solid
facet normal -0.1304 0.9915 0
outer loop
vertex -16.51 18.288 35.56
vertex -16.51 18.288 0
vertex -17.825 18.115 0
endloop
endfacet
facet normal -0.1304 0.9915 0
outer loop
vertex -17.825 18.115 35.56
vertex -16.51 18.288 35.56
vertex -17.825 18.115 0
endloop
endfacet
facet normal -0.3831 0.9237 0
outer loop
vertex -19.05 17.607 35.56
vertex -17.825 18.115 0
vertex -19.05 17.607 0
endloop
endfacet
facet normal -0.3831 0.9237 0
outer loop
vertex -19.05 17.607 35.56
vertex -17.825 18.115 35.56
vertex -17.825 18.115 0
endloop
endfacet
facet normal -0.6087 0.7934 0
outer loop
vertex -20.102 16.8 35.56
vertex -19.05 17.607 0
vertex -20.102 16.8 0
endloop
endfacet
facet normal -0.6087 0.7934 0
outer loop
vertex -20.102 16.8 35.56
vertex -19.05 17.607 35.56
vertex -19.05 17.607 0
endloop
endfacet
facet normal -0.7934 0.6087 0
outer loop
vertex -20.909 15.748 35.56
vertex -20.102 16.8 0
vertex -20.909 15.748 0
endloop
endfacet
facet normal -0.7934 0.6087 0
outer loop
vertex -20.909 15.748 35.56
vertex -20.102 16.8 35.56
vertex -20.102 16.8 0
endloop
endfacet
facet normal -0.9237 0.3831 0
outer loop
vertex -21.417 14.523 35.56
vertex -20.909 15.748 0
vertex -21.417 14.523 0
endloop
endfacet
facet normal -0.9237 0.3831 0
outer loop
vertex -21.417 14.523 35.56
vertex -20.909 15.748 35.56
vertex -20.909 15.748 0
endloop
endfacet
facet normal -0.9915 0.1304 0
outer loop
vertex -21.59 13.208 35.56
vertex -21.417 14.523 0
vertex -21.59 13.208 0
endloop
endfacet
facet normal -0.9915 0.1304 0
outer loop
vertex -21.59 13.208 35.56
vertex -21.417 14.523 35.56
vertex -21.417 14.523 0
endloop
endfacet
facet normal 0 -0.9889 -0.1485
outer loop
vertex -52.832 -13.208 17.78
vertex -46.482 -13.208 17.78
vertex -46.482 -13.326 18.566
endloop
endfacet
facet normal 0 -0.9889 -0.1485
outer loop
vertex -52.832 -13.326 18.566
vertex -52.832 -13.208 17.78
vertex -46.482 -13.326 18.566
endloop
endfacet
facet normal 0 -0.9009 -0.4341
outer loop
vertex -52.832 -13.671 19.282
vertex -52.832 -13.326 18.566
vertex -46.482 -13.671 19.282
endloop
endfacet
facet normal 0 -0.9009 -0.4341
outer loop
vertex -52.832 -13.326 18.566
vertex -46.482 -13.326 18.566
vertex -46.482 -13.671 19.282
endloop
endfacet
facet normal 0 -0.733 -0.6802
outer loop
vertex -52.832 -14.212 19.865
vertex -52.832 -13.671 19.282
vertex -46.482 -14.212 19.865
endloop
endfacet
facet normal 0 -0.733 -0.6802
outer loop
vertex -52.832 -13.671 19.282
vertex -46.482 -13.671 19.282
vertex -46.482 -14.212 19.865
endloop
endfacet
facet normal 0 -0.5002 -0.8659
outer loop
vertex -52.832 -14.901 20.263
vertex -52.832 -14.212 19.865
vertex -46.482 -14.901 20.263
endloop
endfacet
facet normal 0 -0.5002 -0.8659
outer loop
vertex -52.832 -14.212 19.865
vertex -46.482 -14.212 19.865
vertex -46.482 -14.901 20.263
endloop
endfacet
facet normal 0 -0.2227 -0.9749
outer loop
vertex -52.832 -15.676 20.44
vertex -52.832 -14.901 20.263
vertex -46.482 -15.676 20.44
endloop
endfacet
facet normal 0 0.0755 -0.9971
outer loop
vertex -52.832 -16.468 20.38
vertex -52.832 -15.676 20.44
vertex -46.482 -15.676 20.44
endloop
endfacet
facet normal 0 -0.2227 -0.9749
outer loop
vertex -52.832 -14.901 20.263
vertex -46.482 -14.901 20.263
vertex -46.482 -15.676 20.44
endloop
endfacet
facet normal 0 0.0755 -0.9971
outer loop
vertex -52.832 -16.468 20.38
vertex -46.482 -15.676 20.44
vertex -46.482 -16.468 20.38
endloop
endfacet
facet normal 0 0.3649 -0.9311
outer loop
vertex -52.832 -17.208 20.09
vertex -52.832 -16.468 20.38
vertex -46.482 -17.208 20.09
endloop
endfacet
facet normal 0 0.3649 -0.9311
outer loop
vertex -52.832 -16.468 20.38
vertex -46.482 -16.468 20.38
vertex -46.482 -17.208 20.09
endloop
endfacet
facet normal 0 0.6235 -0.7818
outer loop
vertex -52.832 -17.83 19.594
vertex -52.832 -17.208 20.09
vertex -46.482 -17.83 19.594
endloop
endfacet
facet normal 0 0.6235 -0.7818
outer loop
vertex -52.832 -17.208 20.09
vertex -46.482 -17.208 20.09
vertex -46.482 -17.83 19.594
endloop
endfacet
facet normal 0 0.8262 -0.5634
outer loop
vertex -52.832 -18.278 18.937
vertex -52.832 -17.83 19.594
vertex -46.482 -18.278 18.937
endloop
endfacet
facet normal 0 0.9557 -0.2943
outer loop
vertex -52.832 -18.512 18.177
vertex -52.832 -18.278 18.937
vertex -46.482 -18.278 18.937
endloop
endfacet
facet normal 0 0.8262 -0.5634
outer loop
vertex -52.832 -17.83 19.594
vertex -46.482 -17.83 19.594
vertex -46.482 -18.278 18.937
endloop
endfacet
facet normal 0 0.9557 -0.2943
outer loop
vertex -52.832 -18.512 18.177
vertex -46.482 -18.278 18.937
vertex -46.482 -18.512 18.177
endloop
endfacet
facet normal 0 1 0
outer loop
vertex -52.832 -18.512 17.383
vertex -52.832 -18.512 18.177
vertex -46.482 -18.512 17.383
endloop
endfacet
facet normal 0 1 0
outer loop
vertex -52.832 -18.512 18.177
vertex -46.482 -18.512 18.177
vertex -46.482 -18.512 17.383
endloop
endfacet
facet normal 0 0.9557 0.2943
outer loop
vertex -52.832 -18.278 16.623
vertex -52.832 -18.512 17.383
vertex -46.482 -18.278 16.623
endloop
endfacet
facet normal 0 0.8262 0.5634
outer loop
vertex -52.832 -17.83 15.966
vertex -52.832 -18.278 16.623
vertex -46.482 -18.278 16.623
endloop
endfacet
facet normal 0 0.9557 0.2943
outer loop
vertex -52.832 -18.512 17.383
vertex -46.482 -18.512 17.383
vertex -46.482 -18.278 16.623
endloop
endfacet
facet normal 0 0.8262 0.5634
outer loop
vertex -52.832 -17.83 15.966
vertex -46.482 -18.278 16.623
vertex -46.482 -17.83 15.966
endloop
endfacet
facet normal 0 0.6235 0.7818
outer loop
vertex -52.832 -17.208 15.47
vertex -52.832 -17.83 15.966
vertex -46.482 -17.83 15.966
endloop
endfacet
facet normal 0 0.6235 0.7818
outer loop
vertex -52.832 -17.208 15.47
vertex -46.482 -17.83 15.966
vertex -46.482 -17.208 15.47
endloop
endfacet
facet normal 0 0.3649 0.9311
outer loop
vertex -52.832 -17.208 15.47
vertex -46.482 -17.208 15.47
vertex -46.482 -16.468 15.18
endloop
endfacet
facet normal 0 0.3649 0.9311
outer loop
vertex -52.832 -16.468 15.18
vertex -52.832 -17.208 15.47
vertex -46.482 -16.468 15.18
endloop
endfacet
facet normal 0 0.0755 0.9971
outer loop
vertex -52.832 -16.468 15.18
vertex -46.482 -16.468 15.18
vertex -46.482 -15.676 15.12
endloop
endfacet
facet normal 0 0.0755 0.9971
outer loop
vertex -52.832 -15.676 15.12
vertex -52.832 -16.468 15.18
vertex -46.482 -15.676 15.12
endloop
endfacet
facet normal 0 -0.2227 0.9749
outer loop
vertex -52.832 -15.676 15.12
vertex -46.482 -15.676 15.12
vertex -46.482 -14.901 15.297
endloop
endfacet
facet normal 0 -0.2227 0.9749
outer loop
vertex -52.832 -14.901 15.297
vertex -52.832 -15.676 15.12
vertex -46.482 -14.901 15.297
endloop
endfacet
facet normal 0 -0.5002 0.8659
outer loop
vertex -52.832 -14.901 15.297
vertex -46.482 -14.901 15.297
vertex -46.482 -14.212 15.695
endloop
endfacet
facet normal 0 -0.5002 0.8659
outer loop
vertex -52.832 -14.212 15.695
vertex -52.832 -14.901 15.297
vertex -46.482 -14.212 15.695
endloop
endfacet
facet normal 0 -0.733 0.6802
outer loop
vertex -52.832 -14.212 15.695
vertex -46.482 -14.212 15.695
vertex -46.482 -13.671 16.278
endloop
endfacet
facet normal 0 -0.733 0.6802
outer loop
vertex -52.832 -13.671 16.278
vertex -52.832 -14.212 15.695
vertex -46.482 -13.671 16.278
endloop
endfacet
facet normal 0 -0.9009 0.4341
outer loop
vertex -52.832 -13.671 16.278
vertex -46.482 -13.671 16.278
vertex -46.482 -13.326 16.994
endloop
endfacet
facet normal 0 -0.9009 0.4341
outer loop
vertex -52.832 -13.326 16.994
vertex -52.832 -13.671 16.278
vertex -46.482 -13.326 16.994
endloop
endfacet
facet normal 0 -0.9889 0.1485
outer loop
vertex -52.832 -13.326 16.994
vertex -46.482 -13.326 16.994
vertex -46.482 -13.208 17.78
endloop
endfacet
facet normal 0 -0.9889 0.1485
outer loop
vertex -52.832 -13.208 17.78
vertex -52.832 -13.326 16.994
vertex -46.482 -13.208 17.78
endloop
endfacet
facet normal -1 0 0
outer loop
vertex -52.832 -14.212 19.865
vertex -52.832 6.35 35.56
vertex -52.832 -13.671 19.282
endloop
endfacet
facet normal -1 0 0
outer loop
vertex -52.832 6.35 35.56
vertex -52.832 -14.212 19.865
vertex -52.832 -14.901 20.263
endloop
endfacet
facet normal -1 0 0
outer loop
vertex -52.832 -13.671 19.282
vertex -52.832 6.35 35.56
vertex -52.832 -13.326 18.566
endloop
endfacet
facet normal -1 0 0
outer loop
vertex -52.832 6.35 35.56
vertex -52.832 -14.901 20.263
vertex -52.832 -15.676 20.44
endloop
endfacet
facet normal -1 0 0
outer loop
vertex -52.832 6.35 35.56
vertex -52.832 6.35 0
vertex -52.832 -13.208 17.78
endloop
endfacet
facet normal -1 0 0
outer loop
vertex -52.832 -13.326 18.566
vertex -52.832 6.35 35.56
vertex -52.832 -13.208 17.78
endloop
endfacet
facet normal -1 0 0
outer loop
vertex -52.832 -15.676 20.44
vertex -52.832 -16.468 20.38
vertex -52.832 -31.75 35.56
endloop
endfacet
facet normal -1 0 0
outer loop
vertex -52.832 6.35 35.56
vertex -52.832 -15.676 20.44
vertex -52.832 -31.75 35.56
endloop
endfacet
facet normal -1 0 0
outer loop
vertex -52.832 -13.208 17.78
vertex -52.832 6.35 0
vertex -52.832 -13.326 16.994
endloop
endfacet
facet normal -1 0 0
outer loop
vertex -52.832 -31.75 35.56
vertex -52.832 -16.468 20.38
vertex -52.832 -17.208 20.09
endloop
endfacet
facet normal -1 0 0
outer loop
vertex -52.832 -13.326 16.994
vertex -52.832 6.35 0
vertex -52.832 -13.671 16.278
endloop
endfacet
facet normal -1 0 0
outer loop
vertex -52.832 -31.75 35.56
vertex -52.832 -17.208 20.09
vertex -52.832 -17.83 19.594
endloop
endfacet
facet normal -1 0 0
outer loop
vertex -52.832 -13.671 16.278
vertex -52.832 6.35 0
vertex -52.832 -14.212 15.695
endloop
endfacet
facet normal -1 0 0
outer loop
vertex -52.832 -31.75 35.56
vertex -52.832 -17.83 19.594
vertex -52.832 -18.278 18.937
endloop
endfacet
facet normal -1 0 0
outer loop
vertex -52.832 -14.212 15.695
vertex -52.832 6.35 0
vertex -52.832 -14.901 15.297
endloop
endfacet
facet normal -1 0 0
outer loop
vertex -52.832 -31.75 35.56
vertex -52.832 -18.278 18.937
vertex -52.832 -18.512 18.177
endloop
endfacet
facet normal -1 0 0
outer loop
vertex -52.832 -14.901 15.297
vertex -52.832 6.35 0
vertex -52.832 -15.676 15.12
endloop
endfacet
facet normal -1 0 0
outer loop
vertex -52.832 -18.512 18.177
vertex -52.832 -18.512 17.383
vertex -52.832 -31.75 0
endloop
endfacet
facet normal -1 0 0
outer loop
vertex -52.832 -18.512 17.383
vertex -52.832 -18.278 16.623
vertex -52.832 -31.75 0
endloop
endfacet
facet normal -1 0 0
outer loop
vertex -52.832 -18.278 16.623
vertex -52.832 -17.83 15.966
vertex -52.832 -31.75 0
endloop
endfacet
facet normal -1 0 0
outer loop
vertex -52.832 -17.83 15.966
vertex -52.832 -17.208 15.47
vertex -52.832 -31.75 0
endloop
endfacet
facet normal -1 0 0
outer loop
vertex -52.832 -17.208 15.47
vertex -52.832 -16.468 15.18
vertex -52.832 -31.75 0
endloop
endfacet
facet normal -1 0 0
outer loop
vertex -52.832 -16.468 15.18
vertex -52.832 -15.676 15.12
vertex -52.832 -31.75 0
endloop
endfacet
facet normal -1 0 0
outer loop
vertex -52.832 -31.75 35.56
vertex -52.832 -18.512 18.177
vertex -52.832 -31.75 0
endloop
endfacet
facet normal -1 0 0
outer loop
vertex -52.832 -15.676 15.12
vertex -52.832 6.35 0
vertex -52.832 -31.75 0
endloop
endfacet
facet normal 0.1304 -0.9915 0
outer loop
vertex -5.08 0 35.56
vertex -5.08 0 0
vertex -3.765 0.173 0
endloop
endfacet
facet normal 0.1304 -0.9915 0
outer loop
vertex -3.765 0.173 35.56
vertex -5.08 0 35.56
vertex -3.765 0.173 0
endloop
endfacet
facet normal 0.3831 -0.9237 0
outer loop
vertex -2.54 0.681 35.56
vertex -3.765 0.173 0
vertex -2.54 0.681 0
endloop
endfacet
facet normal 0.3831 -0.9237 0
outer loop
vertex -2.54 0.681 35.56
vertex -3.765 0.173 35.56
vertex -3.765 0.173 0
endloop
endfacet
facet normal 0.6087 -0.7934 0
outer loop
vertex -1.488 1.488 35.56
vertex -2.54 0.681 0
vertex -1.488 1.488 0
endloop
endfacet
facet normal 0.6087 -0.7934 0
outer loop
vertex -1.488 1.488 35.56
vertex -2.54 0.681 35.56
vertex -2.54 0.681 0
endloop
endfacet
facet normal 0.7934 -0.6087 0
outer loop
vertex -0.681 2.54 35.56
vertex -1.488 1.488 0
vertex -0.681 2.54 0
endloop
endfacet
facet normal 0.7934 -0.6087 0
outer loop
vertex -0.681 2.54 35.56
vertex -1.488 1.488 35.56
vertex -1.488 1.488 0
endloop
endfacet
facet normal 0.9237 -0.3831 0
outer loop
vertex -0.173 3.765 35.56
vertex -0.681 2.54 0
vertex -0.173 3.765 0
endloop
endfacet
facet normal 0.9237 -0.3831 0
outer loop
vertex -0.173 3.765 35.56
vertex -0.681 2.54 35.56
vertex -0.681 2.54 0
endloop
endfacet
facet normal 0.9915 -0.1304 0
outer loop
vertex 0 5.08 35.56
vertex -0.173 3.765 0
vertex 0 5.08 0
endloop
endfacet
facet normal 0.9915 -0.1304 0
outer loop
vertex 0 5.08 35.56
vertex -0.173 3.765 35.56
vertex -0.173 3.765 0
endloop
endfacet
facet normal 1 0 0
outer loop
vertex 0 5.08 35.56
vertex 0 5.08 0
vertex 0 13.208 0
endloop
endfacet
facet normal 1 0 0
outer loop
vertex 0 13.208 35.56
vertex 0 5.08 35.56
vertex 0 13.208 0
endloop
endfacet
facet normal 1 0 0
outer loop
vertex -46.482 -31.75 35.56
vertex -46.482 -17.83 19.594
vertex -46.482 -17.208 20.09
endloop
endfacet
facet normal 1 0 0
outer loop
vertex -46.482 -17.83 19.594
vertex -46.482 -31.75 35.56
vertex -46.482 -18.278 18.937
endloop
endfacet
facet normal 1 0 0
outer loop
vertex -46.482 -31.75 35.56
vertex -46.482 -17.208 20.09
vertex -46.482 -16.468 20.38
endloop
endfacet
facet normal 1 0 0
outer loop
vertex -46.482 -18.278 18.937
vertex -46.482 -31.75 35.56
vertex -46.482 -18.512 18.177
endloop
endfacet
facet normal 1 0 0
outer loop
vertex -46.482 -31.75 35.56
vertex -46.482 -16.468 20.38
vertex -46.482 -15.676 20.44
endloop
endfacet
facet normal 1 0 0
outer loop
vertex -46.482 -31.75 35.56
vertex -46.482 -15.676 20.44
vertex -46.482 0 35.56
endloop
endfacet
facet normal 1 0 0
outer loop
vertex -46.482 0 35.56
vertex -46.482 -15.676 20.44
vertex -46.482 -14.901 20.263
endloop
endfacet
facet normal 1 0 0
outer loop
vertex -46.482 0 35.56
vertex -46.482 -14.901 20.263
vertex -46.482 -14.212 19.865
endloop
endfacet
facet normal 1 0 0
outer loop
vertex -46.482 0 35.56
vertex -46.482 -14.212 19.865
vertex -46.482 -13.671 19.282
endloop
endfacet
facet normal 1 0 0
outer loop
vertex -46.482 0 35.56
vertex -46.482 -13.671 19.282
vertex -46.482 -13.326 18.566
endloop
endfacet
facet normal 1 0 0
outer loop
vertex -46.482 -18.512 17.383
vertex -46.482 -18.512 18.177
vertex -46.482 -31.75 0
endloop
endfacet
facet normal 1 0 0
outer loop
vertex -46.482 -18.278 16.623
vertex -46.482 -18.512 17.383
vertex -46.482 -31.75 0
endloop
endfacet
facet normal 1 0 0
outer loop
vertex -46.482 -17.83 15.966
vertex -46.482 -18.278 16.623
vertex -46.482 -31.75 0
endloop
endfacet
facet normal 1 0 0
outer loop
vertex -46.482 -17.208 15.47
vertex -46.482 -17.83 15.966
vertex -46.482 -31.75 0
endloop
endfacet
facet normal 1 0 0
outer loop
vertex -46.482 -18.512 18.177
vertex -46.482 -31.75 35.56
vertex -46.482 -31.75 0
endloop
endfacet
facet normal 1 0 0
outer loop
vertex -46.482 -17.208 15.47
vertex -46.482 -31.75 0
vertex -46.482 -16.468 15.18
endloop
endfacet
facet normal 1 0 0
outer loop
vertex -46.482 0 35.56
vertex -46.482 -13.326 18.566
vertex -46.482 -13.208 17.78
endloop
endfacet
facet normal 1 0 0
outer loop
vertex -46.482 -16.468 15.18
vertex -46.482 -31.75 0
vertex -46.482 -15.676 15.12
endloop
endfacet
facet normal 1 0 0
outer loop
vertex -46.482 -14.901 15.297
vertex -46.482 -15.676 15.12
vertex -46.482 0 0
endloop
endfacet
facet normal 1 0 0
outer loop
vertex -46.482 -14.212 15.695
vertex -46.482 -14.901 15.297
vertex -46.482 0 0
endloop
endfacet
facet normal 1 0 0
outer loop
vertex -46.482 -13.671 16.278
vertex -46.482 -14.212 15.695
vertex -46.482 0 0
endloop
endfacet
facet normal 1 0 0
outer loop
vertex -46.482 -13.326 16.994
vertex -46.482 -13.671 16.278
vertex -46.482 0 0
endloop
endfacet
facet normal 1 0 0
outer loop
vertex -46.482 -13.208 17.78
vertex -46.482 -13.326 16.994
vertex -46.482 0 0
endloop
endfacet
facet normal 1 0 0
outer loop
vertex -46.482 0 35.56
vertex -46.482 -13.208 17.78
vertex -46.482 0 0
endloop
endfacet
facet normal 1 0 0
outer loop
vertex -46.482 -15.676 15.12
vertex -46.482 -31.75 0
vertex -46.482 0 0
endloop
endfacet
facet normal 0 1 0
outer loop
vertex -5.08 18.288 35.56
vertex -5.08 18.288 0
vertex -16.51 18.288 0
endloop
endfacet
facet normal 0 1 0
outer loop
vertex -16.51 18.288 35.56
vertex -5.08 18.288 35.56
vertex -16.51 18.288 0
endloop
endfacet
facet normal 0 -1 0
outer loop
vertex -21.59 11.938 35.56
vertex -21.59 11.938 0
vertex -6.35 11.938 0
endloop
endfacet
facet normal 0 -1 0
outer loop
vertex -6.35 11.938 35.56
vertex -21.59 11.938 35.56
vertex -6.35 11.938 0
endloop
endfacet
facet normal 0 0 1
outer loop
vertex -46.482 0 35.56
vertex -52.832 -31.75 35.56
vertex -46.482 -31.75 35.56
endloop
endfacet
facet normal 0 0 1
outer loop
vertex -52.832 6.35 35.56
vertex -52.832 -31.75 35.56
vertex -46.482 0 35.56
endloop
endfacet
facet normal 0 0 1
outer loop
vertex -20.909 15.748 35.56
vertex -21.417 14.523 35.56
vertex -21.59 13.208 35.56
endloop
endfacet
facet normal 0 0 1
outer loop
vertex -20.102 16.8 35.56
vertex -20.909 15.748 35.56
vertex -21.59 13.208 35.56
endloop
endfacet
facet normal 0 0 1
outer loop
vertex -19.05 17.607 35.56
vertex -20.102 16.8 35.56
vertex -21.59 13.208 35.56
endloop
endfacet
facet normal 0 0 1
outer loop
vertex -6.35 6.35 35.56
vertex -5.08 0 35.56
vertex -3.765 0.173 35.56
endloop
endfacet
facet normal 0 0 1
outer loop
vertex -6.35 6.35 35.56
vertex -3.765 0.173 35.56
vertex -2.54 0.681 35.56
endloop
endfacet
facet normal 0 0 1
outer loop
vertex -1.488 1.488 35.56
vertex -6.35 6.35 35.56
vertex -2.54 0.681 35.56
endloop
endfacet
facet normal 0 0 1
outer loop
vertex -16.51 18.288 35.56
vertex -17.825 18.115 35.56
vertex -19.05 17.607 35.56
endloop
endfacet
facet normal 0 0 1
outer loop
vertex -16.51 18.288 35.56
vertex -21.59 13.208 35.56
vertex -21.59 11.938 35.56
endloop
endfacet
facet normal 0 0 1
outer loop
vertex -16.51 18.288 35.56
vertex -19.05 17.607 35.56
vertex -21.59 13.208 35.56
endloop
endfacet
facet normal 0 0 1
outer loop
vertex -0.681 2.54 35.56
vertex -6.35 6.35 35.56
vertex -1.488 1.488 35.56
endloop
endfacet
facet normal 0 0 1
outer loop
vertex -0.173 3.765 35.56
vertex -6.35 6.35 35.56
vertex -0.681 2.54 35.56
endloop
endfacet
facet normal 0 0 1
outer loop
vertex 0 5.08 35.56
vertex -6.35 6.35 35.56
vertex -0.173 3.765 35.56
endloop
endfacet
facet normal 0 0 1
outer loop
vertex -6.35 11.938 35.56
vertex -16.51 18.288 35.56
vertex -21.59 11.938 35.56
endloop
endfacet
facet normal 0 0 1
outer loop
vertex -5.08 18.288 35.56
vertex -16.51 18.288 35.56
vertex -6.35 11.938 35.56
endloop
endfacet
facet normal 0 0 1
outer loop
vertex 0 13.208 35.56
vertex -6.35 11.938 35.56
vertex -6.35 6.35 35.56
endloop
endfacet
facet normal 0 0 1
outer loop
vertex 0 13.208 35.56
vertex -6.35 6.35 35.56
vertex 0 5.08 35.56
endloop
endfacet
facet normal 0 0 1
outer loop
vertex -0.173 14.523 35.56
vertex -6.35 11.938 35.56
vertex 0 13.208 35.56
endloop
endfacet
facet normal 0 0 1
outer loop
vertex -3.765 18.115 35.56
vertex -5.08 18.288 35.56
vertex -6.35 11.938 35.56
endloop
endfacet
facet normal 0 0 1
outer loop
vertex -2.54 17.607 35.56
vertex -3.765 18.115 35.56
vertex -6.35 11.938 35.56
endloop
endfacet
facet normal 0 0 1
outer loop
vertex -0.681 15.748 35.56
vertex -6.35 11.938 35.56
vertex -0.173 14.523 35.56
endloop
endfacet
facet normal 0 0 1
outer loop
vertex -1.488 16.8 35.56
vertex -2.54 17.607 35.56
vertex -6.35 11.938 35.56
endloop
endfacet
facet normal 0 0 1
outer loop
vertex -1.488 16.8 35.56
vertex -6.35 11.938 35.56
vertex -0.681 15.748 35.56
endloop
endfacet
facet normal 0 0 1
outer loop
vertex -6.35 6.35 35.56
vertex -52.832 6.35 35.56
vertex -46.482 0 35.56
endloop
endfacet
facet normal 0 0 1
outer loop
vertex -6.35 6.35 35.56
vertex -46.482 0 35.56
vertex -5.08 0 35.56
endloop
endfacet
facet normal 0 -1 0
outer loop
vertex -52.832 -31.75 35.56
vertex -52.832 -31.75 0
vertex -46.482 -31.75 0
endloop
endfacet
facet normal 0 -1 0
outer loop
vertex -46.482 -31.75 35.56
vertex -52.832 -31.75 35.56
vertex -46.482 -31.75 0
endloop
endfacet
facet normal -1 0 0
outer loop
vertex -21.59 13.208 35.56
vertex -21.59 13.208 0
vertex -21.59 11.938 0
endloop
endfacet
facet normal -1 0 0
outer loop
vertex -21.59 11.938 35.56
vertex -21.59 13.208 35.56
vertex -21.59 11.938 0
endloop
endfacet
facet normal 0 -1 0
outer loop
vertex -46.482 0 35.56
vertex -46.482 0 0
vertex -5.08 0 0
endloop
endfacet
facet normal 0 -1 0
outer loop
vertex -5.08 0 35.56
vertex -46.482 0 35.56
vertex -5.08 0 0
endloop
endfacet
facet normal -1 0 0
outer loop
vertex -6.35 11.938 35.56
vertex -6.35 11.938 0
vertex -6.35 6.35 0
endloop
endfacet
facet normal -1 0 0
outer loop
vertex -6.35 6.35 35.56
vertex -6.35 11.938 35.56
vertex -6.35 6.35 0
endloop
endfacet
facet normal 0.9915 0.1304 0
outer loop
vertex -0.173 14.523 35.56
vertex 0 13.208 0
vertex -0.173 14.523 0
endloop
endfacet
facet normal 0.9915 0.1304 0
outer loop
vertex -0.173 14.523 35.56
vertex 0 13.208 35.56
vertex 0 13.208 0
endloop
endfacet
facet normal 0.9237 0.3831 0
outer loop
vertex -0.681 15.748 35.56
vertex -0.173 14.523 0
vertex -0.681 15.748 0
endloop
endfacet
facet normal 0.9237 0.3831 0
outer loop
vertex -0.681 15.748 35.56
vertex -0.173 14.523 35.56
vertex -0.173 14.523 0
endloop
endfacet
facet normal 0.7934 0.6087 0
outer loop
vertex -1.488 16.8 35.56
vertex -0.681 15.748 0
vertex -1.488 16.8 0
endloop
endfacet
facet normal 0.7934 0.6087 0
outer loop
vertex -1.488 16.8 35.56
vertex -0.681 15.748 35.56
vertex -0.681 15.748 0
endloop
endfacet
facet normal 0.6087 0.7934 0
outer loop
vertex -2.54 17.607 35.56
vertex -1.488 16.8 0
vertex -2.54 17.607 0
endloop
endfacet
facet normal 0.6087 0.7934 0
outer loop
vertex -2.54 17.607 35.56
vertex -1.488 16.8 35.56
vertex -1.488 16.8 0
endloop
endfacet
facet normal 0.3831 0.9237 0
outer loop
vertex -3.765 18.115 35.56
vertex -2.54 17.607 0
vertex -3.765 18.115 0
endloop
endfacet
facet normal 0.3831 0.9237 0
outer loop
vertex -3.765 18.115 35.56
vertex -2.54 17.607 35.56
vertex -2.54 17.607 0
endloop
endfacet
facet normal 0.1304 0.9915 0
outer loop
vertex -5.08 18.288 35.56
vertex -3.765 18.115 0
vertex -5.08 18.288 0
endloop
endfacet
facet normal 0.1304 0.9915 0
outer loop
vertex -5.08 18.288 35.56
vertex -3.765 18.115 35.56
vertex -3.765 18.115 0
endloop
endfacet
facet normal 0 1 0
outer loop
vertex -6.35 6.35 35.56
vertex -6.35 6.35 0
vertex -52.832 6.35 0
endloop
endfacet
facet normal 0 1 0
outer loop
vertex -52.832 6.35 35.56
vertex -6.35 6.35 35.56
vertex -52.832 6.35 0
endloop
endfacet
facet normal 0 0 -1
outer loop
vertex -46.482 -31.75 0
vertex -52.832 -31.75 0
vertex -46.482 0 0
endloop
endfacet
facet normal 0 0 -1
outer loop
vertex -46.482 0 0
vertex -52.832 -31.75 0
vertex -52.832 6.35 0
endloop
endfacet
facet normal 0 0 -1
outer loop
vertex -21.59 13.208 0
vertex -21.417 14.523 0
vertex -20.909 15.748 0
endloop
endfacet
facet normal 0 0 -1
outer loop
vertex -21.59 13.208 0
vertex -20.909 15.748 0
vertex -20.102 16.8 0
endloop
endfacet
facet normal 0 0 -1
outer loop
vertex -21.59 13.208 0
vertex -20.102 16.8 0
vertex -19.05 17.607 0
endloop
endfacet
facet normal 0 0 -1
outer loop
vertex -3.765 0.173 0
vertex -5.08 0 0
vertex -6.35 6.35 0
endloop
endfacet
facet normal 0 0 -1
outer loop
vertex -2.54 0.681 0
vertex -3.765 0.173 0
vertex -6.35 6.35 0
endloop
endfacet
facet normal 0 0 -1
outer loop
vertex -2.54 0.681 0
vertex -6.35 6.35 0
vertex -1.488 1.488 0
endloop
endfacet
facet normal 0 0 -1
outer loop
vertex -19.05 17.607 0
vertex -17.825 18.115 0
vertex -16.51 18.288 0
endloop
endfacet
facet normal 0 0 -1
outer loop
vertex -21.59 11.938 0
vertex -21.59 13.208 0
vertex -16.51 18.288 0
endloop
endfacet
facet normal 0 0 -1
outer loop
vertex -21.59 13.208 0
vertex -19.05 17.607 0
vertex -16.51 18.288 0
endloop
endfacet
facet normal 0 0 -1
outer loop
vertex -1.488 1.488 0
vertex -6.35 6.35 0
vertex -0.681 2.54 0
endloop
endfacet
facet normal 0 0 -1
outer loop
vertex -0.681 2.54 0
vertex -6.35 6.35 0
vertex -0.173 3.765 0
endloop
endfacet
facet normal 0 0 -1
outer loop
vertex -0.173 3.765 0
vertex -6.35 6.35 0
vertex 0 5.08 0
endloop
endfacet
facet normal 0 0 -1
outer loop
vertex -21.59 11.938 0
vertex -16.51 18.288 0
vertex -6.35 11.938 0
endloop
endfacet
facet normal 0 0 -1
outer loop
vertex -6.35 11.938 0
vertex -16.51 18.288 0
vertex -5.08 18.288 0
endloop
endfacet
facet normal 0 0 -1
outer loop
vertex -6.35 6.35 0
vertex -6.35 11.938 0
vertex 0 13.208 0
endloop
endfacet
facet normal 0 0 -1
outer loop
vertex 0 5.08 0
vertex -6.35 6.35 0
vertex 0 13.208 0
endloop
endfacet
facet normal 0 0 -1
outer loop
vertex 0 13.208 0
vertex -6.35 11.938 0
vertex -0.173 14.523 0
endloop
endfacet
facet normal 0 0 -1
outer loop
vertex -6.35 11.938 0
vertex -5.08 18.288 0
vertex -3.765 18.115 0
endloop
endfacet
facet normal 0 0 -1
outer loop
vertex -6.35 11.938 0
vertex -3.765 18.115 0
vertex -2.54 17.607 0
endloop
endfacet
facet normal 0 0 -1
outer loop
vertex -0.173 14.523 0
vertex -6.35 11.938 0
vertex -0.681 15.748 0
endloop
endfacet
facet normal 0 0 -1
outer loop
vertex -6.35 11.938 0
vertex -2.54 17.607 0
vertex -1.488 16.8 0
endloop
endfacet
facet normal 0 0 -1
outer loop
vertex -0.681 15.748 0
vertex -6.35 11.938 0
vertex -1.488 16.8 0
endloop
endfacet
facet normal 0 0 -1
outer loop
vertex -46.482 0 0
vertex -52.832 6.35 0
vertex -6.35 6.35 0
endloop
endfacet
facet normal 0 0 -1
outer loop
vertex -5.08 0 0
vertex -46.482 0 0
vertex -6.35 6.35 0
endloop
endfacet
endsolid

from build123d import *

# Parameters (mm, degrees)
F1_DEPTH = 35.56
F2_R     = 2.667
F3_DEPTH = 25.4
F4_R     = 5.08


with BuildPart() as f1:
    # F0 (on Top) → F1 (new body)
    with BuildSketch(Plane.XY):
        Polygon((-46.482, 0), (0, 0), (0, 18.288), (-21.59, 18.288), (-21.59, 11.938), (-6.35, 11.938), (-6.35, 6.35), (-52.832, 6.35), (-52.832, -31.75), (-46.482, -31.75), align=None)
    extrude(amount=F1_DEPTH)

    # F2 (on face) → F3 (cut)
    with BuildSketch(Plane.YZ.offset(-46.482)):
        with Locations((-15.875, 17.78)):
            Circle(F2_R)
    extrude(amount=-F3_DEPTH, mode=Mode.SUBTRACT)

    # F4
    f4_edges = [f1.edges().sort_by_distance(p)[0] for p in [
        (0, 0, 17.78),
        (0, 18.288, 17.78),
        (-21.59, 18.288, 17.78),
    ]]
    fillet(f4_edges, radius=F4_R)


solid = f1.part
